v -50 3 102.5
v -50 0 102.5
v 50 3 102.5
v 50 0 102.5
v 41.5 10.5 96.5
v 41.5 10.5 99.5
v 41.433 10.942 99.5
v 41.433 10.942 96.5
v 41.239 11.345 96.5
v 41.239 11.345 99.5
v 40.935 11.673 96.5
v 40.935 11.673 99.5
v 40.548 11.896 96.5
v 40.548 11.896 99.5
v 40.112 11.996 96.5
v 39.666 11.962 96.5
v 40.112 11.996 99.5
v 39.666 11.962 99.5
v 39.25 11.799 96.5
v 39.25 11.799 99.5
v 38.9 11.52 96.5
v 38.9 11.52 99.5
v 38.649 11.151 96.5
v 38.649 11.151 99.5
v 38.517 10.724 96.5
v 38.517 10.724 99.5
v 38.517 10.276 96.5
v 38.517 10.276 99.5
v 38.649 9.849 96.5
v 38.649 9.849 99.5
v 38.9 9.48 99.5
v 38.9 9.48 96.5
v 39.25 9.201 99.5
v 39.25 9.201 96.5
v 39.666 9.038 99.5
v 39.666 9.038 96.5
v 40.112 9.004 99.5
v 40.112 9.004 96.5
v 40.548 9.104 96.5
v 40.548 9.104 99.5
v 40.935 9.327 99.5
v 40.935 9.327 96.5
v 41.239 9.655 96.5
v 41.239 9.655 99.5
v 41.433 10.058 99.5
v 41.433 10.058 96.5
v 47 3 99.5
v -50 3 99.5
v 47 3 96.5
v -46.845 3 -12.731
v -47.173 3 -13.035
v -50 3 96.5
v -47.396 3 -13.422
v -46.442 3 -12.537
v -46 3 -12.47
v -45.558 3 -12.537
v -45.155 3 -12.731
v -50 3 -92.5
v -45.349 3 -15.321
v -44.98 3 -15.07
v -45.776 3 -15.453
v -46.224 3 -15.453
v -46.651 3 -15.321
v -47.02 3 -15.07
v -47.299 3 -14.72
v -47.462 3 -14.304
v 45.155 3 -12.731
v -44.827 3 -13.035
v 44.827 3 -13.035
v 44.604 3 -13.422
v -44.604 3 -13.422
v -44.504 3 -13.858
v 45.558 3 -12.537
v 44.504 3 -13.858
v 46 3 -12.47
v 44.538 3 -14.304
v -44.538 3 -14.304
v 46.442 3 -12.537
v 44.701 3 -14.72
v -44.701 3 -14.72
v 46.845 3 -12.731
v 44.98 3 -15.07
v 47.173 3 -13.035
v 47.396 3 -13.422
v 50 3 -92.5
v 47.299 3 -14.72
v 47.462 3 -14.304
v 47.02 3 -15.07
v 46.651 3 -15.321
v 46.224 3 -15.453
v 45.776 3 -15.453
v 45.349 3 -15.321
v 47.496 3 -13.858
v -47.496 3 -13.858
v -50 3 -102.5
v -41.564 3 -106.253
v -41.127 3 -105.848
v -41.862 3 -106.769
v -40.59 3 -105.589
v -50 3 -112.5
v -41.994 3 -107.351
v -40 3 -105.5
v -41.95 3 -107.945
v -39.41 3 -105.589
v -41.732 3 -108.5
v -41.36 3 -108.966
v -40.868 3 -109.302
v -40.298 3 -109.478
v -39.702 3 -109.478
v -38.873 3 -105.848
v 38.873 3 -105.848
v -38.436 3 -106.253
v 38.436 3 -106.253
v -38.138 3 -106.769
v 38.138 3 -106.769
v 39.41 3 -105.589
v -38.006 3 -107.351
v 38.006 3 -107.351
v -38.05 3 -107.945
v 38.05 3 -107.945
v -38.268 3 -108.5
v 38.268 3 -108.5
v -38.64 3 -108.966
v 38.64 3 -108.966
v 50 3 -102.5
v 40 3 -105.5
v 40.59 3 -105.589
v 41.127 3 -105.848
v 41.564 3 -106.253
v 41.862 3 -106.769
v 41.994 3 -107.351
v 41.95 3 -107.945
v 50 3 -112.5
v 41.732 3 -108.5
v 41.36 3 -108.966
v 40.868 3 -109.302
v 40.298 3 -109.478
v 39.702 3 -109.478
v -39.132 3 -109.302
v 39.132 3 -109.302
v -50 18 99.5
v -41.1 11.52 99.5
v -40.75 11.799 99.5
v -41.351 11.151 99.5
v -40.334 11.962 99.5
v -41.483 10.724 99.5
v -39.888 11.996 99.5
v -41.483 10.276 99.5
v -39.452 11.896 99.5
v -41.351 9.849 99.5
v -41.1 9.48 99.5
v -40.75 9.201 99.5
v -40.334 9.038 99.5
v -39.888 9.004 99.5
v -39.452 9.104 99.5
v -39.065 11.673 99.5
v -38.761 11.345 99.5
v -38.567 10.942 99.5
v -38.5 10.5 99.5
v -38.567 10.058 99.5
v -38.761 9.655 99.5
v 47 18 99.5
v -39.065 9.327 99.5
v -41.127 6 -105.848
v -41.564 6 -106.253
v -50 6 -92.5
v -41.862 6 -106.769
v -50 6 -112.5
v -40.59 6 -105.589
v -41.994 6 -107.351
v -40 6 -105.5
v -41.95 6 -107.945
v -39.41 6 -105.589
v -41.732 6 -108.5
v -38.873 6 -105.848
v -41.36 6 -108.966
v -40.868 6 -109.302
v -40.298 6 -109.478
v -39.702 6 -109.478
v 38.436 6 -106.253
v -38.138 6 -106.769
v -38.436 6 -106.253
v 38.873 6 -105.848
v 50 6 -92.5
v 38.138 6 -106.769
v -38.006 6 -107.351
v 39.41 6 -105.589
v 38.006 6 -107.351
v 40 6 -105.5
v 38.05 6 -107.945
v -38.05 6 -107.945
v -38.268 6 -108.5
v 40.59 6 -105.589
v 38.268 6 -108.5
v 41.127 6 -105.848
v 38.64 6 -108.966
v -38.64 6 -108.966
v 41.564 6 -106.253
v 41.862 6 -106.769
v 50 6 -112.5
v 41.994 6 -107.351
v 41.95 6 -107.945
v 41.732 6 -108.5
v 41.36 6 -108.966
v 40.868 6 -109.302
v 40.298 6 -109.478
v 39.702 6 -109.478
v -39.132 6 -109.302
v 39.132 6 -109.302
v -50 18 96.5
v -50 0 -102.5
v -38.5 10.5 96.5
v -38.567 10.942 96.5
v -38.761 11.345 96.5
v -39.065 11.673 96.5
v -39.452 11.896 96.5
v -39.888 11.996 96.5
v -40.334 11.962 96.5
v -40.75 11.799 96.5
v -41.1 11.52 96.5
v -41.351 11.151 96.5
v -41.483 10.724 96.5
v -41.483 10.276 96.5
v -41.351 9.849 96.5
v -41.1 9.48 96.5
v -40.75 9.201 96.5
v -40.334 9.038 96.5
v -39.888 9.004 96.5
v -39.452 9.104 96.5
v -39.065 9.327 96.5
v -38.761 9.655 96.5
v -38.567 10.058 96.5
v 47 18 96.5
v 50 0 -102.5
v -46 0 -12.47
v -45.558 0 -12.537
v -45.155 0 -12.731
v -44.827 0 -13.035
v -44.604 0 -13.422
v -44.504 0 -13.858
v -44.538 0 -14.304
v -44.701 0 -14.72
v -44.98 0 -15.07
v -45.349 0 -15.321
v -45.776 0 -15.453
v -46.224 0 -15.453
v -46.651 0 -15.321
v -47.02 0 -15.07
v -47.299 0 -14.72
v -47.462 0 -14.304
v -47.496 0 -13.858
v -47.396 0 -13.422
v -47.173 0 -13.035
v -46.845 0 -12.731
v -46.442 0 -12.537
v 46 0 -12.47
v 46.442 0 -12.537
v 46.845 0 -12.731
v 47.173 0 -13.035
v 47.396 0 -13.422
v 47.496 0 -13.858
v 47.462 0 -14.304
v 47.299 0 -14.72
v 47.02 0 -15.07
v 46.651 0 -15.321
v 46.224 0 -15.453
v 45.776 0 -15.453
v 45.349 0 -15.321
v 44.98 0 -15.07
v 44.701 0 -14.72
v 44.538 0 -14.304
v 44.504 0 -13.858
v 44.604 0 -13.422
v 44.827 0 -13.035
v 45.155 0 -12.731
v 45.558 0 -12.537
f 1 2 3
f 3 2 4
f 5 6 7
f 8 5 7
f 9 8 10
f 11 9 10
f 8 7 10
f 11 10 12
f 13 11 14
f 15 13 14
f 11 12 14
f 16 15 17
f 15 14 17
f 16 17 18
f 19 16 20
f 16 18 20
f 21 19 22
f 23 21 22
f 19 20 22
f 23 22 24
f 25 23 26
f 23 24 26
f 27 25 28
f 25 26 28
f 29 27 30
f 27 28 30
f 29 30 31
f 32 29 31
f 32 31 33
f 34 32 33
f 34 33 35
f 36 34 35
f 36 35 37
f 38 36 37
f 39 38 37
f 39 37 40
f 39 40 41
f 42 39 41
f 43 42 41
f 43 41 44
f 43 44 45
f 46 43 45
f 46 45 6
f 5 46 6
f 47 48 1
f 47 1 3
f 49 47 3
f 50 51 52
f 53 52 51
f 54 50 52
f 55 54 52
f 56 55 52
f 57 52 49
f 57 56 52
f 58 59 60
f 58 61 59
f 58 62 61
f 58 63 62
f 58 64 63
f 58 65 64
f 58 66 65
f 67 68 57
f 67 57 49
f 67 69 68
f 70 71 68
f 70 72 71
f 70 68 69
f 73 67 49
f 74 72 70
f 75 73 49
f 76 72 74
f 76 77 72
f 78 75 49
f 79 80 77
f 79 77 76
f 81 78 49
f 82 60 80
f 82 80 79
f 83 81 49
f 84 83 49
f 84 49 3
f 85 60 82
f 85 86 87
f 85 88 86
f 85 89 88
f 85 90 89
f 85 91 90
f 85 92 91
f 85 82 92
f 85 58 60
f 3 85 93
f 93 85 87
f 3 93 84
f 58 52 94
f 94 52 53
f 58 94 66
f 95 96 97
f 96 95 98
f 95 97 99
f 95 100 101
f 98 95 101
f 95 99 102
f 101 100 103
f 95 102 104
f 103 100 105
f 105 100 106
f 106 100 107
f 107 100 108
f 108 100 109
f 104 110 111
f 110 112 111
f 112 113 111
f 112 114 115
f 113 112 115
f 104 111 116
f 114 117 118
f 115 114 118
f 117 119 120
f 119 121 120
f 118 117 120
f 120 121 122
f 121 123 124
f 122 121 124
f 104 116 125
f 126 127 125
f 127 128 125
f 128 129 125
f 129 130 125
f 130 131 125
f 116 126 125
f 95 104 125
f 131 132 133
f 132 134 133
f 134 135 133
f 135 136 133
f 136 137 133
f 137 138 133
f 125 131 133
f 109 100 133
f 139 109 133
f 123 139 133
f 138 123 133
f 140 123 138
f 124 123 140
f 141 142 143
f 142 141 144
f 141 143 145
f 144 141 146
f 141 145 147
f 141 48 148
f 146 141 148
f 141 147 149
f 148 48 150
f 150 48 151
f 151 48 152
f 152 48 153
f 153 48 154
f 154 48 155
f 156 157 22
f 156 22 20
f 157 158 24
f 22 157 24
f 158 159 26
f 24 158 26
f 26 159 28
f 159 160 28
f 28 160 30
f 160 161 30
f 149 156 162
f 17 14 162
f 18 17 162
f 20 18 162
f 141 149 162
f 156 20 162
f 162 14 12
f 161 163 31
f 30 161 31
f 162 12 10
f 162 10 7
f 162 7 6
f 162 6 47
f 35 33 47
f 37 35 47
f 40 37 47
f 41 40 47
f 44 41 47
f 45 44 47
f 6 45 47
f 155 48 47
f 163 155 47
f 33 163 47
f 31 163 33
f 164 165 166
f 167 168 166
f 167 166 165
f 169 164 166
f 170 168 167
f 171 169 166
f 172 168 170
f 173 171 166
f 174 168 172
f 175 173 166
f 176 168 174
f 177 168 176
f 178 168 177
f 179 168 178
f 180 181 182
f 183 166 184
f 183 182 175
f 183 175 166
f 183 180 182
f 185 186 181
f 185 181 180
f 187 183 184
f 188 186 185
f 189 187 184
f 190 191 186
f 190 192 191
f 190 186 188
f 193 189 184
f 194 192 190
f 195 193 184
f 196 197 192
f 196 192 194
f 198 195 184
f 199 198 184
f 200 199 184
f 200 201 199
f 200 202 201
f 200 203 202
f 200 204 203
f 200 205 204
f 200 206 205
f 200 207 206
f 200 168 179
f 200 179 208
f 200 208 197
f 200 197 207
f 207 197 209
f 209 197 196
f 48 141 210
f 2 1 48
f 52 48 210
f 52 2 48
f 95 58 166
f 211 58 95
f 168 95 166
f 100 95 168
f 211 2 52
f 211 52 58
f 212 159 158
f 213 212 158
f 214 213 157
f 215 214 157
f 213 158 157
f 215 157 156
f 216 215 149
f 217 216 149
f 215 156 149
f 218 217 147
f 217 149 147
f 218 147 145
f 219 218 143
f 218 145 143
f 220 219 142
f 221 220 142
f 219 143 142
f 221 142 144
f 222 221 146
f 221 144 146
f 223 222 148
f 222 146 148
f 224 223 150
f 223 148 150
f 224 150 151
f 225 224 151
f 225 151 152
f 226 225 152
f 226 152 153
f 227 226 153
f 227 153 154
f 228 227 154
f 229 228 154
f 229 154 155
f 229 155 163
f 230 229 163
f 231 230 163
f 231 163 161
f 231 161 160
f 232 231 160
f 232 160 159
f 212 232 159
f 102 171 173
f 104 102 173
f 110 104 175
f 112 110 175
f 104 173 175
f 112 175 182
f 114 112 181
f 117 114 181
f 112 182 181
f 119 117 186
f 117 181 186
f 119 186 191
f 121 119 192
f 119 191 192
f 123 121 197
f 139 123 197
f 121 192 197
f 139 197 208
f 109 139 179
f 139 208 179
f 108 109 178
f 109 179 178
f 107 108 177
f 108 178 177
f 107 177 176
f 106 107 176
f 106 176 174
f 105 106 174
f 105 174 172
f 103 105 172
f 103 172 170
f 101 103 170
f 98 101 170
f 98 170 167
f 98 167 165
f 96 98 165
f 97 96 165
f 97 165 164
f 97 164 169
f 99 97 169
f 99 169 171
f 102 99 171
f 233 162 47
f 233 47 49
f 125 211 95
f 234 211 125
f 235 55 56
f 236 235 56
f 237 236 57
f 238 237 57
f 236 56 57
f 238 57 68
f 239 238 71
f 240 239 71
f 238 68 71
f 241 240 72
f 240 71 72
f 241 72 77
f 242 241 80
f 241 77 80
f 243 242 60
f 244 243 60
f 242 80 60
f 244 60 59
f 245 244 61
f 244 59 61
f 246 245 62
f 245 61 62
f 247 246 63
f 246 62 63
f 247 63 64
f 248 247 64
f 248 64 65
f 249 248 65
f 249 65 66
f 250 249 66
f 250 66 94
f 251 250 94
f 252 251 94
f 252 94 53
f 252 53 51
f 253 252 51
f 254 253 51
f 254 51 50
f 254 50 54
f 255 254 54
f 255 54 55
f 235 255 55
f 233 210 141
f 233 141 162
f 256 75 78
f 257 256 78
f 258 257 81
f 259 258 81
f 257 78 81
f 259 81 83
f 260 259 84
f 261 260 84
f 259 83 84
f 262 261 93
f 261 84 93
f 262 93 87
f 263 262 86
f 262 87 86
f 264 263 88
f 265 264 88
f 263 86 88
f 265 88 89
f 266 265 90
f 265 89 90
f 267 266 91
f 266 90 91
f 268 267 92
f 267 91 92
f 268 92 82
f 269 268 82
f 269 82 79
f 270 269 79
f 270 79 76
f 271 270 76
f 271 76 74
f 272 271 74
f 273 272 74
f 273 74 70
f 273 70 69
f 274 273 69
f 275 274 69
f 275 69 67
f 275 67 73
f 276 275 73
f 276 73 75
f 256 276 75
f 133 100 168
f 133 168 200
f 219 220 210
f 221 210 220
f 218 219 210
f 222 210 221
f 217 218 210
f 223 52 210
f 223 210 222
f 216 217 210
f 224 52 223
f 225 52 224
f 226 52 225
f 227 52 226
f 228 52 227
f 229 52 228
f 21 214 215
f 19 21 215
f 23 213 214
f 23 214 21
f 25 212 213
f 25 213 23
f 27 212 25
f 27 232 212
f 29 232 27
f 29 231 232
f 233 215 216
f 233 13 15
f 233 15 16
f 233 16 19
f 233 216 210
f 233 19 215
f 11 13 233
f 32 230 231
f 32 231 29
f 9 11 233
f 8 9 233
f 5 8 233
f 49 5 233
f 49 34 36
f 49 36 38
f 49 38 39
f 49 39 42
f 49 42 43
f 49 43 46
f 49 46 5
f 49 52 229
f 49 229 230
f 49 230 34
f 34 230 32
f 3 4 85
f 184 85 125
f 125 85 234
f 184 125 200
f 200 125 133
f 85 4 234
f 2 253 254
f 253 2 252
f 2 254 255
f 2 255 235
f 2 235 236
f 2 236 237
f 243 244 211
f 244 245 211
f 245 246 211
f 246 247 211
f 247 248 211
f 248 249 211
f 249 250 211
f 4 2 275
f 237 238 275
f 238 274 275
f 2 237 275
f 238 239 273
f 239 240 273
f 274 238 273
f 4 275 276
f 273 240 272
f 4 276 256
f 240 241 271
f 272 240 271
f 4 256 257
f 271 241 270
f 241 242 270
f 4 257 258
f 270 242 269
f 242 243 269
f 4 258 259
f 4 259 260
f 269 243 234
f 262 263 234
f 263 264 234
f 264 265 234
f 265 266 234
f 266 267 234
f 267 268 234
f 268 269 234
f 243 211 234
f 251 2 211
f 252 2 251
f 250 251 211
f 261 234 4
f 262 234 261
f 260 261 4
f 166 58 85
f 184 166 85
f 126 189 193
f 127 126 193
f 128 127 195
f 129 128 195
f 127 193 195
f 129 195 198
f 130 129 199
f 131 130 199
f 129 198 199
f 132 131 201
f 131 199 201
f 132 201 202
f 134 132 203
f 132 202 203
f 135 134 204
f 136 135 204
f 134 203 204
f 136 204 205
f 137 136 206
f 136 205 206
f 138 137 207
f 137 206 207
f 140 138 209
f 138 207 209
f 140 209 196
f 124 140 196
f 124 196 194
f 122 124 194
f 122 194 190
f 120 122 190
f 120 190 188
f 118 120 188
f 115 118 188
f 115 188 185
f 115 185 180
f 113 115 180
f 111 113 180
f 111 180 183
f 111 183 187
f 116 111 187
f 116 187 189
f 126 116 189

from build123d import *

# Parameters (mm, degrees)
SKETCH1_W           = 100
SKETCH1_H           = 205
BOSS_EXTRUDE1_DEPTH = 3
SKETCH2_W           = 100
SKETCH2_H           = 20
BOSS_EXTRUDE2_DEPTH = 3
CUT_EXTRUDE1_REACH  = 125.257
SKETCH3_R           = 2
LPATTERN1_COUNT     = 2
LPATTERN1_PITCH     = 80
SKETCH4_W           = 100
SKETCH4_H           = 3
BOSS_EXTRUDE3_DEPTH = 15
CUT_EXTRUDE2_REACH  = 220.559
SKETCH5_R           = 1.5
LPATTERN2_COUNT     = 2
LPATTERN2_PITCH     = 80
SKETCH7_W           = 3
SKETCH7_H           = 15
CUT_EXTRUDE3_DEPTH  = 3
CUT_EXTRUDE4_REACH  = 126.021
SKETCH6_R           = 1.5


with BuildPart() as part:
    # Sketch1 → Boss-Extrude1 (new body)
    with BuildSketch(Plane(origin=(0, 0, 0), x_dir=(1, 0, 0), z_dir=(0, 1, 0))):
        Rectangle(SKETCH1_W, SKETCH1_H)
    extrude(amount=BOSS_EXTRUDE1_DEPTH)

    # Sketch2 → Boss-Extrude2 (add)
    with BuildSketch(Plane(origin=(0, 3, 0), x_dir=(1, 0, 0), z_dir=(0, 1, 0))):
        with Locations((0, 102.5)):
            Rectangle(SKETCH2_W, SKETCH2_H)
    extrude(amount=BOSS_EXTRUDE2_DEPTH)

    # Sketch3 → Cut-Extrude1 (cut, up to next)
    with BuildSketch(Plane(origin=(0, 6, 0), x_dir=(1, 0, 0), z_dir=(0, 1, 0)), mode=Mode.PRIVATE) as cut_extrude1_sk1:
        with Locations(Location((-40, 107.5, 0), (0, 0, 270))):
            Circle(SKETCH3_R)
    cut_extrude1_tool1 = extrude(cut_extrude1_sk1.sketch, amount=-CUT_EXTRUDE1_REACH, mode=Mode.PRIVATE) & part.part
    cut_extrude1 = cut_extrude1_tool1.solids().sort_by_distance((-40, 6, -107.5))[0]
    add(cut_extrude1, mode=Mode.SUBTRACT)

    # LPattern1: Cut-Extrude1 ×2
    with Locations(*[(i * LPATTERN1_PITCH, 0, 0) for i in range(1, LPATTERN1_COUNT)]):
        add(cut_extrude1, mode=Mode.SUBTRACT)

    # Sketch4 → Boss-Extrude3 (add)
    with BuildSketch(Plane(origin=(0, 3, 0), x_dir=(1, 0, 0), z_dir=(0, 1, 0))):
        with Locations((0, -98)):
            Rectangle(SKETCH4_W, SKETCH4_H)
    extrude(amount=BOSS_EXTRUDE3_DEPTH)

    # Sketch5 → Cut-Extrude2 (cut, up to next)
    with BuildSketch(Plane.XY.offset(99.5), mode=Mode.PRIVATE) as cut_extrude2_sk1:
        with Locations((-40, 10.5)):
            Circle(SKETCH5_R)
    cut_extrude2_tool1 = extrude(cut_extrude2_sk1.sketch, amount=-CUT_EXTRUDE2_REACH, mode=Mode.PRIVATE) & part.part
    cut_extrude2 = cut_extrude2_tool1.solids().sort_by_distance((-40, 10.5, 99.5))[0]
    add(cut_extrude2, mode=Mode.SUBTRACT)

    # LPattern2: Cut-Extrude2 ×2
    with Locations(*[(i * LPATTERN2_PITCH, 0, 0) for i in range(1, LPATTERN2_COUNT)]):
        add(cut_extrude2, mode=Mode.SUBTRACT)

    # Sketch7 → Cut-Extrude3 (cut)
    with BuildSketch(Plane(origin=(50, 0, 0), x_dir=(0, 0, -1), z_dir=(1, 0, 0))):
        with Locations((-98, 10.5)):
            Rectangle(SKETCH7_W, SKETCH7_H)
    extrude(amount=-CUT_EXTRUDE3_DEPTH, mode=Mode.SUBTRACT)

    # Sketch6 → Cut-Extrude4 (cut, up to next)
    with BuildSketch(Plane(origin=(0, 3, 0), x_dir=(1, 0, 0), z_dir=(0, 1, 0)), mode=Mode.PRIVATE) as cut_extrude4_sk1:
        with Locations(Location((-46, 13.97, 0), (0, 0, 270))):
            Circle(SKETCH6_R)
    cut_extrude4_tool1 = extrude(cut_extrude4_sk1.sketch, amount=-CUT_EXTRUDE4_REACH, mode=Mode.PRIVATE) & part.part
    # Sketch6 → Cut-Extrude4 (cut, up to next)
    with BuildSketch(Plane(origin=(0, 3, 0), x_dir=(1, 0, 0), z_dir=(0, 1, 0)), mode=Mode.PRIVATE) as cut_extrude4_sk2:
        with Locations(Location((46, 13.97, 0), (0, 0, 270))):
            Circle(SKETCH6_R)
    cut_extrude4_tool2 = extrude(cut_extrude4_sk2.sketch, amount=-CUT_EXTRUDE4_REACH, mode=Mode.PRIVATE) & part.part
    add(cut_extrude4_tool1.solids().sort_by_distance((-46, 3, -13.97))[0], mode=Mode.SUBTRACT)
    add(cut_extrude4_tool2.solids().sort_by_distance((46, 3, -13.97))[0], mode=Mode.SUBTRACT)


solid = part.part
